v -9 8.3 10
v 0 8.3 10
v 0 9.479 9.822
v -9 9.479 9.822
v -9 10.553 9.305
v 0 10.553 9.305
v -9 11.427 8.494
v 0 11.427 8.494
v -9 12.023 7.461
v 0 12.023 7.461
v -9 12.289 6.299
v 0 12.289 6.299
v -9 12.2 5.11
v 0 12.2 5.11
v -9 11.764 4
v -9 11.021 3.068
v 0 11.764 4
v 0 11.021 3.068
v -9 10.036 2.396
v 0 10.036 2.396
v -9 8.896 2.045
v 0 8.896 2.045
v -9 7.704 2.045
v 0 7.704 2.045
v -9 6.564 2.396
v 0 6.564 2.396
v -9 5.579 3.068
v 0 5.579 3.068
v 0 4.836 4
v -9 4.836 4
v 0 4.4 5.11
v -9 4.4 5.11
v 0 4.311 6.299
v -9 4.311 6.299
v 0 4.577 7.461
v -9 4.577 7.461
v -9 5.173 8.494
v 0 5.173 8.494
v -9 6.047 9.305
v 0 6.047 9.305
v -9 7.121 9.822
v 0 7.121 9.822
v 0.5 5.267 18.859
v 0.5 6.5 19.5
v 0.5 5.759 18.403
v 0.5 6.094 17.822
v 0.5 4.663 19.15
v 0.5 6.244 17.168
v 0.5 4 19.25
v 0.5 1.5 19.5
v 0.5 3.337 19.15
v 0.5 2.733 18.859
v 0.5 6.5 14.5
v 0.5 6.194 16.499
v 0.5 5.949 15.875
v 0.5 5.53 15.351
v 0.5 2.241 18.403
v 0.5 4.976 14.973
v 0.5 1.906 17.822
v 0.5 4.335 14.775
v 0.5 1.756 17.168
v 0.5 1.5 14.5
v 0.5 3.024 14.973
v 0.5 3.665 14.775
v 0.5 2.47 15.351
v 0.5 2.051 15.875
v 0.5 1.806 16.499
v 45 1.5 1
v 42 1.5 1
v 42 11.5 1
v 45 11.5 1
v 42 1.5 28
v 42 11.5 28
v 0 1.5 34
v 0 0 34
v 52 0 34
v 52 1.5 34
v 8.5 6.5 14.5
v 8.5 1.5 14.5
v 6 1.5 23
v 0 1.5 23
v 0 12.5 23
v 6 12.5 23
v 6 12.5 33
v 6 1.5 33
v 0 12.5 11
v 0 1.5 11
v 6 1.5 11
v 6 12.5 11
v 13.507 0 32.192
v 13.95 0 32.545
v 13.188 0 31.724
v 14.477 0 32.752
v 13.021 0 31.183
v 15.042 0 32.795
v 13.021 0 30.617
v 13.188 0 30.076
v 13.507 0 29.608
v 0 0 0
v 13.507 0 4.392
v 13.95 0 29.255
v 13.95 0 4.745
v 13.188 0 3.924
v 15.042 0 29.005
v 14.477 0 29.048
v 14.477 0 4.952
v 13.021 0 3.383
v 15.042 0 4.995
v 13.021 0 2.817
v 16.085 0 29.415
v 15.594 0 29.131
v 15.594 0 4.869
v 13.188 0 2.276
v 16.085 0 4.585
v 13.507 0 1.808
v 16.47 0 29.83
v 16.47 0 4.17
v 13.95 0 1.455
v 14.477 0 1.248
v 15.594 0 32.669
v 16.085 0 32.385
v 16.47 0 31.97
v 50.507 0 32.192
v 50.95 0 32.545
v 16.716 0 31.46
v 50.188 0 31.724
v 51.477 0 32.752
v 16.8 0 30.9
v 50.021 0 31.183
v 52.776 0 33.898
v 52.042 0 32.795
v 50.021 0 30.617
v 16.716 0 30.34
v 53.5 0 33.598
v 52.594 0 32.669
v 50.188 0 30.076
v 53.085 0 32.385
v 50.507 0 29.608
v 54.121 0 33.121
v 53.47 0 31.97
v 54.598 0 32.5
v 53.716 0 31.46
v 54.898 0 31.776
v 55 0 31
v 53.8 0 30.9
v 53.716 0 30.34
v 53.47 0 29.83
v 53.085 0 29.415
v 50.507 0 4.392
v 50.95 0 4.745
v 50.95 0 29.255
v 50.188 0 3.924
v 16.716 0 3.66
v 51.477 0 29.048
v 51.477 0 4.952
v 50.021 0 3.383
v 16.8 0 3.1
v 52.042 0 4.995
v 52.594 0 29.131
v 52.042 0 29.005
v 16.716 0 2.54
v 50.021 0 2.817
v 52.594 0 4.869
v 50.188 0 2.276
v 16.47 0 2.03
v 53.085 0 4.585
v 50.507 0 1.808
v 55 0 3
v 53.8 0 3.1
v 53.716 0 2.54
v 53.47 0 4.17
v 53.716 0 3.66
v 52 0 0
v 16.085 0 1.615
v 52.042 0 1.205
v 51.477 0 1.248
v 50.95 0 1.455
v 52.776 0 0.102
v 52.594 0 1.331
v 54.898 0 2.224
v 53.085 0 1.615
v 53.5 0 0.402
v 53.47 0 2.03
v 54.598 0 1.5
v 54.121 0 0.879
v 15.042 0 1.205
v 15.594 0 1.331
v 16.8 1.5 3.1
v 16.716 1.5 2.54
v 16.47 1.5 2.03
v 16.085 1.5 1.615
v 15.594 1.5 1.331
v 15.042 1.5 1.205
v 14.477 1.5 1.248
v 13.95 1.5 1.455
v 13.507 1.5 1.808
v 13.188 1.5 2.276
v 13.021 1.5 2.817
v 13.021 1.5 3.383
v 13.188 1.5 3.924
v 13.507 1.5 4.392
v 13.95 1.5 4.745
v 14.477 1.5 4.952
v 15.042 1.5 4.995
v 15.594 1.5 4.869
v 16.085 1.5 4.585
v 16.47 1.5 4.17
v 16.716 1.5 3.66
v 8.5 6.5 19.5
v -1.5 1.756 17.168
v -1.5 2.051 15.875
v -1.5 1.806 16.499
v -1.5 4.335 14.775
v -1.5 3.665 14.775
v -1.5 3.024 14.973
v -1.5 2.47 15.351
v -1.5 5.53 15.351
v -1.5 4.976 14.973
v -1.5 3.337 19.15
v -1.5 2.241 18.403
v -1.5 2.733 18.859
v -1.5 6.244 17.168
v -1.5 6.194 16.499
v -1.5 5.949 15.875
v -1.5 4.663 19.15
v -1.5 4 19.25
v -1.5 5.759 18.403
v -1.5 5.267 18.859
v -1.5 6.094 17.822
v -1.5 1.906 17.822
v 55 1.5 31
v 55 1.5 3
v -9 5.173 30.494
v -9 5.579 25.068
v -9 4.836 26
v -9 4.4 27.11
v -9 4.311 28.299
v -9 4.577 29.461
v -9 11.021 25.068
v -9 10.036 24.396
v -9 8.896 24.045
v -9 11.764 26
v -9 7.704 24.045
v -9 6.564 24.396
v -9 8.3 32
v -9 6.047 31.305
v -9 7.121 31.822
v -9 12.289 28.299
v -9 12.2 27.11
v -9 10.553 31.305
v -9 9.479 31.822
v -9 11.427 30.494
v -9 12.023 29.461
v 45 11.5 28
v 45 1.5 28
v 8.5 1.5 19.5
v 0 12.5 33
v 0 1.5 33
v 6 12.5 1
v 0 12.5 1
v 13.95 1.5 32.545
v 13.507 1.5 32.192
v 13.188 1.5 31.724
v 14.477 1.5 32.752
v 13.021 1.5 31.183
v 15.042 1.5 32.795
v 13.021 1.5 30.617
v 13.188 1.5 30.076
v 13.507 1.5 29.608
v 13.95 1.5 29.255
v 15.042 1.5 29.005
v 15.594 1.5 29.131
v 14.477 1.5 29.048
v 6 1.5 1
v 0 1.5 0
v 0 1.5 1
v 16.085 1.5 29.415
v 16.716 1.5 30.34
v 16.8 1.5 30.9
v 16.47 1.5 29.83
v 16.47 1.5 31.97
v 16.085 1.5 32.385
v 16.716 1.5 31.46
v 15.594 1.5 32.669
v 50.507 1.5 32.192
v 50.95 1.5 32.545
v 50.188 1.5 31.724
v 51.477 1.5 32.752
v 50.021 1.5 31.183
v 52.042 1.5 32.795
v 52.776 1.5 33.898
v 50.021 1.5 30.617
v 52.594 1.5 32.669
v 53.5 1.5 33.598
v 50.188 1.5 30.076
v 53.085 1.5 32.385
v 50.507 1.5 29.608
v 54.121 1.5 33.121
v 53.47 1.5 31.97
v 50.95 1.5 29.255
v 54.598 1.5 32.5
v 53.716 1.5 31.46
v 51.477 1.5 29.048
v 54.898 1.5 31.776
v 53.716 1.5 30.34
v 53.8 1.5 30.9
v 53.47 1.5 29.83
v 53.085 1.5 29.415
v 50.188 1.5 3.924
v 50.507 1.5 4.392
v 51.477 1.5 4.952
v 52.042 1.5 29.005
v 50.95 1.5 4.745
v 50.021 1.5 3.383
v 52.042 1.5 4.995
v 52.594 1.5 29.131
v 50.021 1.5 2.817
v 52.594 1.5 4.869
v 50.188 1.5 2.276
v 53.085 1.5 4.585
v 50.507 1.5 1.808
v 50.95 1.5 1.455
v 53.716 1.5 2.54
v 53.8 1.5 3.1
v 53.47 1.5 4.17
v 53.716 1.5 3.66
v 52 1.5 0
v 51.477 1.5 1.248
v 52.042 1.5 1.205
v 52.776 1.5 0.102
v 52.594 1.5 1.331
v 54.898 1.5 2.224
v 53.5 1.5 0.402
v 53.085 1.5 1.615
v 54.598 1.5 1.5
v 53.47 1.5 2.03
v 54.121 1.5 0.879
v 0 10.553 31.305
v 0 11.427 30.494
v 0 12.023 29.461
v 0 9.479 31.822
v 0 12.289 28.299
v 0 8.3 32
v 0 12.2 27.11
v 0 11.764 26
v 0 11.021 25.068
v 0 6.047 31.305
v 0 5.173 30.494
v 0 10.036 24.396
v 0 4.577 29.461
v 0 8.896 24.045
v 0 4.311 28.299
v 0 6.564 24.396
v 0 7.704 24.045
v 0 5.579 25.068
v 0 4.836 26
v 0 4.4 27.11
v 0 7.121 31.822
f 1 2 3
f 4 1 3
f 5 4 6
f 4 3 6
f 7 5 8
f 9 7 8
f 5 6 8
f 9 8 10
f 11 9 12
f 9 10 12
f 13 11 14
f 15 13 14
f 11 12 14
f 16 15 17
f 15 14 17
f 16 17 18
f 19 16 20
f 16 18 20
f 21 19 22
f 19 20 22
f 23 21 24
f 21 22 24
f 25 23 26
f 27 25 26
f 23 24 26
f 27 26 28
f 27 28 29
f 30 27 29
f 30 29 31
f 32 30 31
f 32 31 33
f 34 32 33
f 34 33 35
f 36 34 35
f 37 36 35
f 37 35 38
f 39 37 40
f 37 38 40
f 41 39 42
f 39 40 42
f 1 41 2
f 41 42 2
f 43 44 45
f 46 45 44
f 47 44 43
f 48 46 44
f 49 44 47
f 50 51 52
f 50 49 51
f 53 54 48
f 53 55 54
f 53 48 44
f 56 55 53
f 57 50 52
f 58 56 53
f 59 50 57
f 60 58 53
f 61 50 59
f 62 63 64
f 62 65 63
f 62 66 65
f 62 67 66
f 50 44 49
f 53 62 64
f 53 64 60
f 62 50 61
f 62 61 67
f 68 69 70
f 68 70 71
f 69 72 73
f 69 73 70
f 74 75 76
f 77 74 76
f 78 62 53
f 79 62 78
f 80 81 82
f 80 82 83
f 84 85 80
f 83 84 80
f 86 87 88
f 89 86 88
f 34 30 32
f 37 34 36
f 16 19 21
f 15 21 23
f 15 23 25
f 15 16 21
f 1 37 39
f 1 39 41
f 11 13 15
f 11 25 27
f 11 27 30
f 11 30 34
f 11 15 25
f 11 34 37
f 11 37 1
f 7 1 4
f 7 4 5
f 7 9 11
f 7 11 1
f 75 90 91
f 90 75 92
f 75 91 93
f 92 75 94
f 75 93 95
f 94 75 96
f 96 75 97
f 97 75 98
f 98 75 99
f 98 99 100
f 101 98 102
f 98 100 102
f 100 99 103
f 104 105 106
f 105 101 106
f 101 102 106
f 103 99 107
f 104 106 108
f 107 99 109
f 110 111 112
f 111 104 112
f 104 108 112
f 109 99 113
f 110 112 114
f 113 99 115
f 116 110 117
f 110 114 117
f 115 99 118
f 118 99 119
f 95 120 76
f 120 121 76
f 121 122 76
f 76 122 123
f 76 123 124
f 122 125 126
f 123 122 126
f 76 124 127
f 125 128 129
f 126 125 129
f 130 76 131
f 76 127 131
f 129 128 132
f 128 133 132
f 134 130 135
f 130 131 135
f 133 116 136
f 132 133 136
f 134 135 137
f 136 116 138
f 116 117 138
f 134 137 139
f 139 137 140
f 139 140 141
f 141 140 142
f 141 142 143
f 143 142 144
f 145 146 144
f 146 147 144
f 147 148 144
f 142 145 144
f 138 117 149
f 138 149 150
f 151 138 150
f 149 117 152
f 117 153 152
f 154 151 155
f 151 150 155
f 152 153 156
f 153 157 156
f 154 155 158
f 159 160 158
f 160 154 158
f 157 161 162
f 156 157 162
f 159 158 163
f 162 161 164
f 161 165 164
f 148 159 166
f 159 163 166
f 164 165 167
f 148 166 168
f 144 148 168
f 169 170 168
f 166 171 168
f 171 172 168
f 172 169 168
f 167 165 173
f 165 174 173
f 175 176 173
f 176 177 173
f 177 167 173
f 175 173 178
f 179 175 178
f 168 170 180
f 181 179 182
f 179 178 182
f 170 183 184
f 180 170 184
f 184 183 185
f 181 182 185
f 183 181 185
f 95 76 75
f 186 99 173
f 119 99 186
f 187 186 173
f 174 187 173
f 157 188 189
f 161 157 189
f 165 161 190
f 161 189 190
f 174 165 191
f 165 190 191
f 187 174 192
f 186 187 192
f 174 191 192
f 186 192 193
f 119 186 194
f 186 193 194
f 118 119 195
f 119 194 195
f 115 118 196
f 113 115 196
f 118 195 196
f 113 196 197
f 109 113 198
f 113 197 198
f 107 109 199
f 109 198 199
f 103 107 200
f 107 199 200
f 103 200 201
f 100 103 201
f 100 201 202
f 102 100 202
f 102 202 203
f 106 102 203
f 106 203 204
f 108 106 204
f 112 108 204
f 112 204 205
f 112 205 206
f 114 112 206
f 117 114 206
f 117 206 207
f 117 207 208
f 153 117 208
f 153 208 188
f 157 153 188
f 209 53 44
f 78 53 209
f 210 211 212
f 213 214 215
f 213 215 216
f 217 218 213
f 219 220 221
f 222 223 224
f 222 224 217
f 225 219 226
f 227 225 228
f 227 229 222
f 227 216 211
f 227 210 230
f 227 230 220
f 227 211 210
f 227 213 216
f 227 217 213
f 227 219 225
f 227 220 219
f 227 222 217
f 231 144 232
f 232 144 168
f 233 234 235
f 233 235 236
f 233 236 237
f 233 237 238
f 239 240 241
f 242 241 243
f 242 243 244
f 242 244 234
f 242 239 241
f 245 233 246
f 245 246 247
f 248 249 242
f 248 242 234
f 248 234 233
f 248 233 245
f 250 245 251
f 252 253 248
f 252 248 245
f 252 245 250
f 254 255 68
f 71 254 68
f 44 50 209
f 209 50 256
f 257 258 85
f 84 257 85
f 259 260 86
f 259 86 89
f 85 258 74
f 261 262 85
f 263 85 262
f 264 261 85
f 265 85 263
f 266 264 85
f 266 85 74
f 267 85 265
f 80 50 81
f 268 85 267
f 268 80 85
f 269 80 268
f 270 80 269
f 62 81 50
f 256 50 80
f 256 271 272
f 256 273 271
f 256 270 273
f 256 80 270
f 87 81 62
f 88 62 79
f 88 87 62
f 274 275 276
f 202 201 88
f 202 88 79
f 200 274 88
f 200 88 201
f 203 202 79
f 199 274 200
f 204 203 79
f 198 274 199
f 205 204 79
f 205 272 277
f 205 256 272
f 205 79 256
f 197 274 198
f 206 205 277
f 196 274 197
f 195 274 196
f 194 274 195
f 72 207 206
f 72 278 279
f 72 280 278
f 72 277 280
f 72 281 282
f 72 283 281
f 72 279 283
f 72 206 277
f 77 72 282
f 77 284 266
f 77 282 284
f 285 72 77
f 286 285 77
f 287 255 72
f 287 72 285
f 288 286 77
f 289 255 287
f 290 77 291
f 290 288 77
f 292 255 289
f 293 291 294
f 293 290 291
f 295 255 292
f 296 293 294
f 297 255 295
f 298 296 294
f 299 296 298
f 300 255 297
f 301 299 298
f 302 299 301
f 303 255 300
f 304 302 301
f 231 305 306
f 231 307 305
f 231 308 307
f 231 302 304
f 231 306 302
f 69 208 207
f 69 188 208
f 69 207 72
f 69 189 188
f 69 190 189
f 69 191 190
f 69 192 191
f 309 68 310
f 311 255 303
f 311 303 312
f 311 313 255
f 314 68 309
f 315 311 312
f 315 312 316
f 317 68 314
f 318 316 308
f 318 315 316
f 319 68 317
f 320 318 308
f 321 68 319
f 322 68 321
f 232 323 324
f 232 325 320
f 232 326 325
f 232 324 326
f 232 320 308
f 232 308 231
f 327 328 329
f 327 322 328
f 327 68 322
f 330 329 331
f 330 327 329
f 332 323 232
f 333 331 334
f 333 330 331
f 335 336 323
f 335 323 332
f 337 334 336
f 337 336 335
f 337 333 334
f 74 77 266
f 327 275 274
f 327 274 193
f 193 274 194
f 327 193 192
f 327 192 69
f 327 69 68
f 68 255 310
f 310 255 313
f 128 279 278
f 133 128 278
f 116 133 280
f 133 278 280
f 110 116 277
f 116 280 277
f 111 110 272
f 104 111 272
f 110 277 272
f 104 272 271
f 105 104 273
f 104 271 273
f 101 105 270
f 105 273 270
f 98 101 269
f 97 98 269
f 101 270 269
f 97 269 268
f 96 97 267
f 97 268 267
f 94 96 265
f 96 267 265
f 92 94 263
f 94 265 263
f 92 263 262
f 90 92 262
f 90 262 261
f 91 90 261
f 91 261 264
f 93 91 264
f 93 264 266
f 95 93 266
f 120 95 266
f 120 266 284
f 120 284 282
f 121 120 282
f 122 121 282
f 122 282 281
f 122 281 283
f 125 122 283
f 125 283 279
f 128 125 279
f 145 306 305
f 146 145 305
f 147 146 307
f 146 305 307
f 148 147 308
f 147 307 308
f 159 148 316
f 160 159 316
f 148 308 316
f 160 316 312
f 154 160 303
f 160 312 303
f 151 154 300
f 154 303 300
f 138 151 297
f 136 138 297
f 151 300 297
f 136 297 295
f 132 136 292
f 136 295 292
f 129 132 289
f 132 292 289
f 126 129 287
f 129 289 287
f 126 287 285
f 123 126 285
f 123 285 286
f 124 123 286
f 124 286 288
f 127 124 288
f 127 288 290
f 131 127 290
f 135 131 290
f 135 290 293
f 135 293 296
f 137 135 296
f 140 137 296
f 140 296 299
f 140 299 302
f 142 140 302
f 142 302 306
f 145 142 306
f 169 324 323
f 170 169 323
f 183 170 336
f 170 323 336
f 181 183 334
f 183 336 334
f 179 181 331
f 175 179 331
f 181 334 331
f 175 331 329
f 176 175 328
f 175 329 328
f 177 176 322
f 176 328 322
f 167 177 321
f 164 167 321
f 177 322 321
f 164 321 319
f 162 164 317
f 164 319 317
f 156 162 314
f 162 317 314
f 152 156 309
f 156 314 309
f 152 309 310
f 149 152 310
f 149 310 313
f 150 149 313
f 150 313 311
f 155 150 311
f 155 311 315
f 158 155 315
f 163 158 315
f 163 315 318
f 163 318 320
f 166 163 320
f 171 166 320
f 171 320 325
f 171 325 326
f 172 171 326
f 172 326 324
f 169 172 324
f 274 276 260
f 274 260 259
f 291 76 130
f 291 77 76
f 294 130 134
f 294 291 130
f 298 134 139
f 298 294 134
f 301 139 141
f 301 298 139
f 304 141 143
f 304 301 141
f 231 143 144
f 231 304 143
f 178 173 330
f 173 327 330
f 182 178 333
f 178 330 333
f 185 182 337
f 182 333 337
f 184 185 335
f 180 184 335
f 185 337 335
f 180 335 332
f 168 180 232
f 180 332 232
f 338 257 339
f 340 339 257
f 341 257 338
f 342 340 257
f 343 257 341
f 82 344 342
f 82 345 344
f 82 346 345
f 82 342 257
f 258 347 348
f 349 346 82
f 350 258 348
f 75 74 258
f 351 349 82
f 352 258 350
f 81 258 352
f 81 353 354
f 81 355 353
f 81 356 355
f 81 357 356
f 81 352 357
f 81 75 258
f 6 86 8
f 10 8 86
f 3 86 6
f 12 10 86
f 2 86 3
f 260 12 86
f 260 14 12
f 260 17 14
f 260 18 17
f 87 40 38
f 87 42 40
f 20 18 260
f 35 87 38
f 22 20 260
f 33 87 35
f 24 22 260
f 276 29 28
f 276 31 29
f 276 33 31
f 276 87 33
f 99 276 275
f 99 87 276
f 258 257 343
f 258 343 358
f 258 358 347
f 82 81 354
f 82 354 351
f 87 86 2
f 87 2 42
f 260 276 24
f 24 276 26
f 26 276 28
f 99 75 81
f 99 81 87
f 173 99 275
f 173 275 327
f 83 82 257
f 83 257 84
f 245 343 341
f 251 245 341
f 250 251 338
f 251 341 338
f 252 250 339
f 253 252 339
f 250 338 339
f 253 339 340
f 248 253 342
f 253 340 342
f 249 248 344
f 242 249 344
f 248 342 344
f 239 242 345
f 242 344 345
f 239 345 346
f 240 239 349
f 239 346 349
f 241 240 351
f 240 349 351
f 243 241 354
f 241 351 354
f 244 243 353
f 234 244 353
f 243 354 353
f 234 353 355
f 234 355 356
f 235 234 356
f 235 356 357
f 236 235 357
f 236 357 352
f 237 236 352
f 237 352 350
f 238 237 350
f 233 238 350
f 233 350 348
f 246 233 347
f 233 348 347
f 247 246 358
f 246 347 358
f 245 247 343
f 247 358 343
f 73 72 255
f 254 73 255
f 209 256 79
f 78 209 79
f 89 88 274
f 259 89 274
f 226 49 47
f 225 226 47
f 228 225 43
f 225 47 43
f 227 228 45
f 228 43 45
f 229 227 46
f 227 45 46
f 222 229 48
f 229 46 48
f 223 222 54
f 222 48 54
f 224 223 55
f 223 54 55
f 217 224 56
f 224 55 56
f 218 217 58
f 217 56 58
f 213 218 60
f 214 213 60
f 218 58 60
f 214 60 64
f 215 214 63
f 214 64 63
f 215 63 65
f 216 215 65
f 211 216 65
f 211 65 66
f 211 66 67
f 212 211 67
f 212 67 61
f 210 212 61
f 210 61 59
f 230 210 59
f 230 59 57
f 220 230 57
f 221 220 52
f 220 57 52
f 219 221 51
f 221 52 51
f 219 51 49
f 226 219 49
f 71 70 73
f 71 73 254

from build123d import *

# Parameters (mm, degrees)
SKETCH1_W           = 55
SKETCH1_H           = 34
BOSS_EXTRUDE1_DEPTH = 1.5
SKETCH2_R           = 1.9
CUT_EXTRUDE1_DEPTH  = 2.5
FILLET1_R           = 3
SKETCH3_W           = 8
SKETCH3_H           = 5
BOSS_EXTRUDE2_DEPTH = 5
SKETCH4_R           = 2.25
BOSS_EXTRUDE3_DEPTH = 2
SKETCH5_W           = 3
SKETCH5_H           = 27
BOSS_EXTRUDE4_DEPTH = 10
SKETCH6_W           = 6
SKETCH6_H           = 10
BOSS_EXTRUDE5_DEPTH = 11
SKETCH7_R           = 4
BOSS_EXTRUDE6_DEPTH = 9


with BuildPart() as part:
    # Sketch1 → Boss-Extrude1 (new body)
    with BuildSketch(Plane(origin=(0, 0, 0), x_dir=(1, 0, 0), z_dir=(0, 1, 0))):
        with Locations((27.5, -17)):
            Rectangle(SKETCH1_W, SKETCH1_H)
    extrude(amount=BOSS_EXTRUDE1_DEPTH)

    # Sketch2 → Cut-Extrude1 (cut, through all)
    with BuildSketch(Plane(origin=(0, 1.5, 0), x_dir=(1, 0, 0), z_dir=(0, 1, 0))):
        with Locations((51.9, -30.9)):
            Circle(SKETCH2_R)
        with Locations((14.9, -30.9)):
            Circle(SKETCH2_R)
        with Locations((14.9, -3.1)):
            Circle(SKETCH2_R)
        with Locations((51.9, -3.1)):
            Circle(SKETCH2_R)
    extrude(amount=-CUT_EXTRUDE1_DEPTH, mode=Mode.SUBTRACT)

    # Fillet1
    fillet1_edges = [part.edges().sort_by_distance(p)[0] for p in [
        (55, 0.75, 0),
        (55, 0.75, 34),
    ]]
    fillet(fillet1_edges, radius=FILLET1_R)

    # Sketch3 → Boss-Extrude2 (add)
    with BuildSketch(Plane(origin=(0, 1.5, 0), x_dir=(1, 0, 0), z_dir=(0, 1, 0))):
        with Locations((4.5, -17)):
            Rectangle(SKETCH3_W, SKETCH3_H)
    extrude(amount=BOSS_EXTRUDE2_DEPTH)

    # Sketch4 → Boss-Extrude3 (add)
    with BuildSketch(Plane.ZY.offset(-0.5)):
        with Locations((17, 4)):
            Circle(SKETCH4_R)
    extrude(amount=BOSS_EXTRUDE3_DEPTH)

    # Sketch5 → Boss-Extrude4 (add)
    with BuildSketch(Plane(origin=(0, 1.5, 0), x_dir=(1, 0, 0), z_dir=(0, 1, 0))):
        with Locations((43.5, -14.5)):
            Rectangle(SKETCH5_W, SKETCH5_H)
    extrude(amount=BOSS_EXTRUDE4_DEPTH)

    # Sketch6 → Boss-Extrude5 (add)
    with BuildSketch(Plane(origin=(0, 1.5, 0), x_dir=(1, 0, 0), z_dir=(0, 1, 0))):
        with Locations((3, -6)):
            Rectangle(SKETCH6_W, SKETCH6_H)
        with Locations((3, -28)):
            Rectangle(SKETCH6_W, SKETCH6_H)
    extrude(amount=BOSS_EXTRUDE5_DEPTH)

    # Sketch7 → Boss-Extrude6 (add)
    with BuildSketch(Plane.ZY):
        with Locations((28, 8.3)):
            Circle(SKETCH7_R)
        with Locations((6, 8.3)):
            Circle(SKETCH7_R)
    extrude(amount=BOSS_EXTRUDE6_DEPTH)


solid = part.part
